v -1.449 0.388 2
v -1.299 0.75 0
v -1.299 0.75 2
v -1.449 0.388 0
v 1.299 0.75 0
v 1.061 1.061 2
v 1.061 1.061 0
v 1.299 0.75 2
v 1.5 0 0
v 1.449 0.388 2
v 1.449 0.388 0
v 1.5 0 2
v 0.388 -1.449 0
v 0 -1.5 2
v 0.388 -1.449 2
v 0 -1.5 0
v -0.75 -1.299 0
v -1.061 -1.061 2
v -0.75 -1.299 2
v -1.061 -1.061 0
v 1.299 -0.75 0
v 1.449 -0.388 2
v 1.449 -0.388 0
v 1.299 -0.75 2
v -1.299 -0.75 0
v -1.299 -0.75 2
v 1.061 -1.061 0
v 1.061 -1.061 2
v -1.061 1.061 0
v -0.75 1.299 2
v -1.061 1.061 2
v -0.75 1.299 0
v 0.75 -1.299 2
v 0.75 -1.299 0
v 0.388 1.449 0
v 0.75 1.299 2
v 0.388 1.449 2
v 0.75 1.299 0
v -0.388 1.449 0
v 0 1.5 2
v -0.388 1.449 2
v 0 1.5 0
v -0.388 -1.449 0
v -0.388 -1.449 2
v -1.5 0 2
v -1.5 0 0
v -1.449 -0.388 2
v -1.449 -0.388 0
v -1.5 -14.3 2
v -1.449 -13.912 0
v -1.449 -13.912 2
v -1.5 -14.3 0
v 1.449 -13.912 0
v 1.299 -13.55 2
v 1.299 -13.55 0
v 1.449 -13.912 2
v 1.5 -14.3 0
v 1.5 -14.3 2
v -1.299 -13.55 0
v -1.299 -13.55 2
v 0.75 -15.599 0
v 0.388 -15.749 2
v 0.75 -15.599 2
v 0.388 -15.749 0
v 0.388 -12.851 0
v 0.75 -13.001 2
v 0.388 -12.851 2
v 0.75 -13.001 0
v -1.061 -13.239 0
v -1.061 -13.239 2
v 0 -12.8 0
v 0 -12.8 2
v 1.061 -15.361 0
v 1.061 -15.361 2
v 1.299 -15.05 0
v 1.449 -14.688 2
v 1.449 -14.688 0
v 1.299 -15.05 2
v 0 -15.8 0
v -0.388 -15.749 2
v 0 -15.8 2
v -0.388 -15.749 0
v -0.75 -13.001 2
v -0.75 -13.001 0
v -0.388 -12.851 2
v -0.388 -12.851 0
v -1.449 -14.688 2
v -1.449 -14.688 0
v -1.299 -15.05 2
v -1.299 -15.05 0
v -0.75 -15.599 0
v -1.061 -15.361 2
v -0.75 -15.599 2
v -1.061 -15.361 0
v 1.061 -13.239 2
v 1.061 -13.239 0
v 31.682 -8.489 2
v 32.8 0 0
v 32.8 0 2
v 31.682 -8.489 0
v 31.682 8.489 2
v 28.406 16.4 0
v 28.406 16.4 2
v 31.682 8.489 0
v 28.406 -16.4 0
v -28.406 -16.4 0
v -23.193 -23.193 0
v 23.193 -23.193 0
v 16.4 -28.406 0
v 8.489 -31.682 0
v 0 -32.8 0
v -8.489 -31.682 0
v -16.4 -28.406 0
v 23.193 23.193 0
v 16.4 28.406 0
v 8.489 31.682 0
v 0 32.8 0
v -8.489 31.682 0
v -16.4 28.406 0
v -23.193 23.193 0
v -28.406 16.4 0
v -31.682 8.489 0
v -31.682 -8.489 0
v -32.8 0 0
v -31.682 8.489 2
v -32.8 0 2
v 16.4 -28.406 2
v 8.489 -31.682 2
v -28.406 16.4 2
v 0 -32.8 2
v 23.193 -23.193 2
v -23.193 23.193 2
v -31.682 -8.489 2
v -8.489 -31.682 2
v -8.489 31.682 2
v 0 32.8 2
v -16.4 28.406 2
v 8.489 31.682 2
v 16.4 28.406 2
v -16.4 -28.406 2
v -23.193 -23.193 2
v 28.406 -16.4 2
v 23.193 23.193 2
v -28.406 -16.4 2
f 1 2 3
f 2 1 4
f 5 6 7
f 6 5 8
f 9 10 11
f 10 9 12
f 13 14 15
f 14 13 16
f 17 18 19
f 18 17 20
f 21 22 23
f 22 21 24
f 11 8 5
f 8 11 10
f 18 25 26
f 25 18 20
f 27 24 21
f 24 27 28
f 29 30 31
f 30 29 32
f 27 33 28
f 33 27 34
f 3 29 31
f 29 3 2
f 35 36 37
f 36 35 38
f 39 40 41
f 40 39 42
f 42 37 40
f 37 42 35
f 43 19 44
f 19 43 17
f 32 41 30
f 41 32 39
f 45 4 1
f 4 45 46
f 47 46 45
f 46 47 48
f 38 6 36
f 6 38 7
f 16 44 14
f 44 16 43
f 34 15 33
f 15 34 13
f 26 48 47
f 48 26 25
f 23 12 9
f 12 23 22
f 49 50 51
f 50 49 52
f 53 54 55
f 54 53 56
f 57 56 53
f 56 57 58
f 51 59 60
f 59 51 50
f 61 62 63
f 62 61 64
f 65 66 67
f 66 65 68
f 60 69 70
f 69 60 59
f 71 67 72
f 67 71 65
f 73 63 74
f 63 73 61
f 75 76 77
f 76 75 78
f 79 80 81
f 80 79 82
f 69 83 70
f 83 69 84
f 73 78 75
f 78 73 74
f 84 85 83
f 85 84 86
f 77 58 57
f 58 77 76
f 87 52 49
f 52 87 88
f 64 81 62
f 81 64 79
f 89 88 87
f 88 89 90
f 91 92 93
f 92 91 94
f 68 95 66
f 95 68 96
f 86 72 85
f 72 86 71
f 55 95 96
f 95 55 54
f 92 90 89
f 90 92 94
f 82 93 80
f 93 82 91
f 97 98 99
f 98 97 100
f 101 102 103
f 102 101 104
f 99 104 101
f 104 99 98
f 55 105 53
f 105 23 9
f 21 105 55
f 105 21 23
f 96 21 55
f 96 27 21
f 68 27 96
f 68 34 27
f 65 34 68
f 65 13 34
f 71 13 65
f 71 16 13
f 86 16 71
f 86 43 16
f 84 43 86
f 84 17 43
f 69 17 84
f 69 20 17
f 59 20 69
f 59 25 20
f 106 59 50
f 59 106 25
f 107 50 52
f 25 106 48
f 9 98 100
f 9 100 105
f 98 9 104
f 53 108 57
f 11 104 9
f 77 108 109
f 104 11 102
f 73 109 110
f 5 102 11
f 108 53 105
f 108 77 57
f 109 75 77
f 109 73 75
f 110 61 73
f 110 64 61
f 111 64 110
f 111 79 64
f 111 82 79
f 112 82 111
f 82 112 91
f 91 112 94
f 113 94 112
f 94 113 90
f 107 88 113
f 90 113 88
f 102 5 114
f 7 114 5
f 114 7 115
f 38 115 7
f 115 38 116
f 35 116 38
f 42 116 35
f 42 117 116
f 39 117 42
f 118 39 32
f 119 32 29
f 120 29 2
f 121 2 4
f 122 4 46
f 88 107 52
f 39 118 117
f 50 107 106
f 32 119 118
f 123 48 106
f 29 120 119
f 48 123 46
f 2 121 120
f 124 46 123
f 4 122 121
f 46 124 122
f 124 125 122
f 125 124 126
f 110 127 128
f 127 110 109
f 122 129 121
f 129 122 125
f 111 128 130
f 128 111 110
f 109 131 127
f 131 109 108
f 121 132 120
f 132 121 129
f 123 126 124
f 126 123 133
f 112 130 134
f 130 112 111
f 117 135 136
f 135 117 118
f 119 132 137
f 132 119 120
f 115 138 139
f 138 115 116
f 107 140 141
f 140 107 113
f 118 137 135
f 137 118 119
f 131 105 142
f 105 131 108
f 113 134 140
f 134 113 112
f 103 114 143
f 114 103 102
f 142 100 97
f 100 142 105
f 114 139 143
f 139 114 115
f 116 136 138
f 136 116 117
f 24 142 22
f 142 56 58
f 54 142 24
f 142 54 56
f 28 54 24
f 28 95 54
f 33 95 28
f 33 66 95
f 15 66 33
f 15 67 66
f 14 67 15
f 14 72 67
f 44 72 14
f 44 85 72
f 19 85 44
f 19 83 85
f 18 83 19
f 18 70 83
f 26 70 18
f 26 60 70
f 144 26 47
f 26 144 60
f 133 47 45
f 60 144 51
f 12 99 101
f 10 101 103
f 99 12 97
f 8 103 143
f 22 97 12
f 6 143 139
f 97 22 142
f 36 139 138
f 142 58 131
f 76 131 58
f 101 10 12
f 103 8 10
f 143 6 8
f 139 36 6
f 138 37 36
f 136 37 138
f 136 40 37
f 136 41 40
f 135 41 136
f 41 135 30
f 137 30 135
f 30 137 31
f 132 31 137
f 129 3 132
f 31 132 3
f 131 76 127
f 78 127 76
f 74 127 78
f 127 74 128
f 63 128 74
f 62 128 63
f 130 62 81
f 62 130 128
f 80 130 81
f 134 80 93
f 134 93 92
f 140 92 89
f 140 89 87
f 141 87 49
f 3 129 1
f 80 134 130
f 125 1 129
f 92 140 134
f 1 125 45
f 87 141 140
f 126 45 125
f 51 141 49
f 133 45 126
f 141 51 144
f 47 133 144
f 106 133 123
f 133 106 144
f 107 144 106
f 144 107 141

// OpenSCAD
// file: rods.scad
include <definitions.scad>


module rod1() {
	cylinder(r=ROD_DIAMETER/2, h=250, center=true);
}

module rod2() {
	translate([0, -GEARS_DISTANCE, 0])
	cylinder(r=ROD_DIAMETER/2, h=250, center=true);
}

module rods() {
	rod1();
	rod2();
}

rods();
// file: definitions.scad
// ============================================================================
// NOTES:
// Definitions file. To be imported via the include <> statement.
// You can render it for test, but do not export to STL.
//
// ============================================================================

//
// GENERAL
//

$fn = 96;
$fn = 8;
$fn = 24;
//$fn = 12;

PLAY = 0.4;
TOLERANCE = 0.17;
ATOM = 0.01;
WALL_THICKNESS = 1;

//
// SERVO (new)
//

SERVO_THICKNESS = 11.5;
SERVO_AXIS_RADIUS = 3;
SERVO_LENGTH = 33.3;

//
// GEARS (new)
//

GEARS_DISTANCE = 14.3;
//echo("GEARS_DISTANCE", GEARS_DISTANCE);

GEARS_THICKNESS = 5;
WHEEL_AXIS_TIGHTEN = TOLERANCE*0.75;
WHEEL_HOLE_DIAMETER = SERVO_AXIS_RADIUS*2 - WHEEL_AXIS_TIGHTEN;

//PINION_RADIUS = 5.6;
//WHEEL_RADIUS = 10.6;
WHEEL_PLATE_HEIGHT = 1;

//    Erlaubte Module nach DIN 780:
//    0.05 0.06 0.08 0.10 0.12 0.16
//    0.20 0.25 0.3  0.4  0.5  0.6
//    0.7  0.8  0.9  1    1.25 1.5
//    2    2.5  3    4    5    6
//    8    10   12   16   20   25
//    32   40   50   60
GEARS_MODULE = 0.65;

ROD_DIAMETER = 3;



// Plate
PLATE_DIAMETER = 50;
PLATE_HEIGHT = 20.5;
PLATES_OVERLAP = 12;

PLATE_HEIGHT_SHORT = 18;


PLATE2_WHEEL_HEIGHT = 2.5;
PLATE2_HEIGHT = PLATE2_WHEEL_HEIGHT + GEARS_THICKNESS;
//echo("PLATE2_HEIGHT", PLATE2_HEIGHT);

PLATE2_GROVE_HEIGHT = 2;
PLATE2_GROVE_THICKNESS = 5;
PLATE2_LEVER_HEIGHT = 2;

PLATE2_BAR_WIDTH = 5;
PLATE2_RADIUS_RECESSION = 1.5;

PLATE2_RADIUS = PLATE_DIAMETER/2 - PLATE2_RADIUS_RECESSION;

BASE_PLATE_CAVITY_DIAMETER = 20;
BASE_PLATE_CROWN_HEIGHT = 9;

// Side screws
SCREW_PLATE_HEIGHT = 1;
SCREW2_DIAMETER = 2.9;
SCREW2_HEAD_DIAMETER = 5.5;
SCREW2_HEAD_THICKNESS = 2;
SCREW2_HEIGHT = 12; // overall

SERVO_SCREW1_H_DISPLACEMENT = 20.5;
SERVO_SCREW2_H_DISPLACEMENT = -9;
SERVO_SCREW_V_DISPLACEMENT = -10.75;
SERVO_SCREW_HEAD_EXTENT = 20;

SERVO_SCREW_THREAD_DIAMETER = 2.5;


HOLDER_ARM_HEIGHT = 13;
HOLDER_ARM_RADIUS_SHORTAGE = 15;
HOLDER_ARM_RADIUS = 4;
HOLDER_ARM_THICKNESS = 6;
HOLDER_THICKNESS = 3;
HOLDER_ANGLE = 35; //20
HOLDER_MODULES_SPACING = 10;


block_cylinder = PLATE_HEIGHT + PLATE2_HEIGHT;
BLOCKS_JOIN = 0.3;
BLOCK1_HEIGHT = block_cylinder*2  + PLAY*2 - PLATE2_HEIGHT;
BLOCK1_HEIGHT_STACKABLE = BLOCK1_HEIGHT + BLOCKS_JOIN;

BLOCK2_HEIGHT = PLATE2_HEIGHT + PLAY*2;
BLOCK2_HEIGHT_STACKABLE = BLOCK2_HEIGHT + BLOCKS_JOIN;
//echo("BLOCK2_HEIGHT (w/o join)", BLOCK2_HEIGHT);

BLOCK3_HEIGHT = block_cylinder*2  + PLAY*2 - PLATE2_HEIGHT;
BLOCK3_HEIGHT_STACKABLE = BLOCK3_HEIGHT + BLOCKS_JOIN;

DIGIT_SEGMENT_WIDTH = 3.5;
DIGIT_SEGMENT_WIDTH = BLOCK2_HEIGHT - PLAY;

// Snapping
SNAP_HOLE_DIAMETER = 4;

CUBE_CROWN_HEIGHT = 3.5;
CUBE_CROWN_SHORT_HEIGHT = 1;
CUBE_LEVER_THICKNESS = 4;
CUBE_SNAP_BALLS_RADIUS = 0.6/2; // <== ADJUST
CUBE_SNAP_BALLS_RADIUS = 0.6/3; // <== ADJUST
CUBE_SNAP_BALLS_RADIUS = 0.6/2.5; // <== ADJUST
CUBE_SNAP_BALLS_K = 3;

PLATE2_Z = BLOCK1_HEIGHT_STACKABLE
         + CUBE_CROWN_HEIGHT
         + BLOCK2_HEIGHT/2
         - PLATE2_WHEEL_HEIGHT/2;

//////////////////////////////////////////////////////////////////////////

//
// SPECIFIC
//

//// Center screw
//SCREW_SHAFT_DIAMETER = 2;
//SCREW_THREAD_DIAMETER = 2.5;
//SCREW_HOLE_LENGTH = 5;



// PLATE 2
PINION_NECK_RADIUS = 6.5;
PINION_SCREW_HEAD_RADIUS = 3 + PLAY;

PINION_THICKNESS = 5.3;
PINION_HEIGHT = PINION_THICKNESS;

BLOCKS_WIDTH = 70;

PLATE2_BOX_INNER_HOLE_DIAMETER = 62;

WHEEL_THICKNESS = 3.5 -0.2;

SERVO_X_ADJUSTMENT = 0.5;
SERVO_X_POSITION = WHEEL_THICKNESS - SCREW_PLATE_HEIGHT
                   + SERVO_X_ADJUSTMENT;
//echo("Servo x pos: ", SERVO_X_POSITION);

HOLDER_RADIUS = 29.5;
HOLDER_SPINE_THICKNESS = 2.5 +1;

ZIP_TIE_SLIT_WIDTH = 3;
ZIP_TIE_SLIT_THICKNESS = 2;
ZIP_TIE_BUMP_RADIUS = 1;

//echo("Total height: ", PLATE_HEIGHT+PLATE2_HEIGHT+PLAY+TOLERANCE);


//
// DIGIT SEGMENTS
// 

SEGMENTS_TOP = ["a", "b", "c", "c", "b", "d", "d", "c", "a", "a"];
SEGMENTS_MID = ["j", "i", "k", "k", "k", "k", "k", "i", "k", "k"];
SEGMENTS_LOW = ["e", "f", "g", "h", "f", "h", "e", "f", "e", "h"];

//
// HELPERS
//

module spoke(radius, width, height) {
    translate([0, 0, height/2])
    intersection() {
        cube([radius*3, width, height], true);

        translate([0, 0, -height/2])
        scale([1, 1, height])
        cylinder(r=radius, true);
    }
}

module barrel(outer_radius, inner_radius, height) {
    scale([1, 1, height])
    difference() {
        cylinder(r=outer_radius);
        translate([0, 0, -0.5]) scale([1, 1, 2])
        cylinder(r=inner_radius);
    }
}

module box_sides(outer_side, thickness, height) {
    scale([1, 1, height/outer_side])
    translate([0, 0, outer_side/2])
    difference() {
        cube(outer_side, true);
        scale([1, 1, 2])
        cube(outer_side - thickness*2, true);
    }
}

module alignment_columns(column_extra=0, height=1) {
    r = PLATE_DIAMETER/2 - PLATE_SCREWS_BORDER_DISTANCE;
    n = 4;
    offset_angle = 45;
    scale([1, 1, height])
    for(a=[0:n-1])
        rotate([0, 0, a*360/n + offset_angle])
        translate([0, r, 0])
        cylinder(r=SNAP_HOLE_DIAMETER/2 + column_extra, true);        
}

function servo_cover_height() =
           PLATE_HEIGHT
           - (WHEEL_EXTERNAL_DIAMETER/2 - PINION_THICKNESS
              + SERVO_THICKNESS/2)
           -TOLERANCE;

module screw(head_extent=0, is_clearance_hole=false) {   
    // thread
    translate([0, 0, -SCREW2_HEIGHT + SCREW2_HEAD_THICKNESS])
    cylinder(h=SCREW2_HEIGHT,
             r=SCREW2_DIAMETER/2 - TOLERANCE
               + (is_clearance_hole ? TOLERANCE*2 : 0));
    // head
    cylinder(h=SCREW2_HEAD_THICKNESS+head_extent, 
             r=SCREW2_HEAD_DIAMETER/2
               +(is_clearance_hole ? PLAY : 0));
}

module flip(height, additional_angle=0) {
        translate([0, 0, height])
        rotate([180, 0, 90-additional_angle])
        children();
}
// main file
include <definitions.scad>
use <rods.scad>

module disc(recess, thickness) {
	difference() {
		cylinder(r=BLOCKS_WIDTH/2-recess-PLAY/2, h=thickness);
		rods();
	}
}

disc(2, 2);
